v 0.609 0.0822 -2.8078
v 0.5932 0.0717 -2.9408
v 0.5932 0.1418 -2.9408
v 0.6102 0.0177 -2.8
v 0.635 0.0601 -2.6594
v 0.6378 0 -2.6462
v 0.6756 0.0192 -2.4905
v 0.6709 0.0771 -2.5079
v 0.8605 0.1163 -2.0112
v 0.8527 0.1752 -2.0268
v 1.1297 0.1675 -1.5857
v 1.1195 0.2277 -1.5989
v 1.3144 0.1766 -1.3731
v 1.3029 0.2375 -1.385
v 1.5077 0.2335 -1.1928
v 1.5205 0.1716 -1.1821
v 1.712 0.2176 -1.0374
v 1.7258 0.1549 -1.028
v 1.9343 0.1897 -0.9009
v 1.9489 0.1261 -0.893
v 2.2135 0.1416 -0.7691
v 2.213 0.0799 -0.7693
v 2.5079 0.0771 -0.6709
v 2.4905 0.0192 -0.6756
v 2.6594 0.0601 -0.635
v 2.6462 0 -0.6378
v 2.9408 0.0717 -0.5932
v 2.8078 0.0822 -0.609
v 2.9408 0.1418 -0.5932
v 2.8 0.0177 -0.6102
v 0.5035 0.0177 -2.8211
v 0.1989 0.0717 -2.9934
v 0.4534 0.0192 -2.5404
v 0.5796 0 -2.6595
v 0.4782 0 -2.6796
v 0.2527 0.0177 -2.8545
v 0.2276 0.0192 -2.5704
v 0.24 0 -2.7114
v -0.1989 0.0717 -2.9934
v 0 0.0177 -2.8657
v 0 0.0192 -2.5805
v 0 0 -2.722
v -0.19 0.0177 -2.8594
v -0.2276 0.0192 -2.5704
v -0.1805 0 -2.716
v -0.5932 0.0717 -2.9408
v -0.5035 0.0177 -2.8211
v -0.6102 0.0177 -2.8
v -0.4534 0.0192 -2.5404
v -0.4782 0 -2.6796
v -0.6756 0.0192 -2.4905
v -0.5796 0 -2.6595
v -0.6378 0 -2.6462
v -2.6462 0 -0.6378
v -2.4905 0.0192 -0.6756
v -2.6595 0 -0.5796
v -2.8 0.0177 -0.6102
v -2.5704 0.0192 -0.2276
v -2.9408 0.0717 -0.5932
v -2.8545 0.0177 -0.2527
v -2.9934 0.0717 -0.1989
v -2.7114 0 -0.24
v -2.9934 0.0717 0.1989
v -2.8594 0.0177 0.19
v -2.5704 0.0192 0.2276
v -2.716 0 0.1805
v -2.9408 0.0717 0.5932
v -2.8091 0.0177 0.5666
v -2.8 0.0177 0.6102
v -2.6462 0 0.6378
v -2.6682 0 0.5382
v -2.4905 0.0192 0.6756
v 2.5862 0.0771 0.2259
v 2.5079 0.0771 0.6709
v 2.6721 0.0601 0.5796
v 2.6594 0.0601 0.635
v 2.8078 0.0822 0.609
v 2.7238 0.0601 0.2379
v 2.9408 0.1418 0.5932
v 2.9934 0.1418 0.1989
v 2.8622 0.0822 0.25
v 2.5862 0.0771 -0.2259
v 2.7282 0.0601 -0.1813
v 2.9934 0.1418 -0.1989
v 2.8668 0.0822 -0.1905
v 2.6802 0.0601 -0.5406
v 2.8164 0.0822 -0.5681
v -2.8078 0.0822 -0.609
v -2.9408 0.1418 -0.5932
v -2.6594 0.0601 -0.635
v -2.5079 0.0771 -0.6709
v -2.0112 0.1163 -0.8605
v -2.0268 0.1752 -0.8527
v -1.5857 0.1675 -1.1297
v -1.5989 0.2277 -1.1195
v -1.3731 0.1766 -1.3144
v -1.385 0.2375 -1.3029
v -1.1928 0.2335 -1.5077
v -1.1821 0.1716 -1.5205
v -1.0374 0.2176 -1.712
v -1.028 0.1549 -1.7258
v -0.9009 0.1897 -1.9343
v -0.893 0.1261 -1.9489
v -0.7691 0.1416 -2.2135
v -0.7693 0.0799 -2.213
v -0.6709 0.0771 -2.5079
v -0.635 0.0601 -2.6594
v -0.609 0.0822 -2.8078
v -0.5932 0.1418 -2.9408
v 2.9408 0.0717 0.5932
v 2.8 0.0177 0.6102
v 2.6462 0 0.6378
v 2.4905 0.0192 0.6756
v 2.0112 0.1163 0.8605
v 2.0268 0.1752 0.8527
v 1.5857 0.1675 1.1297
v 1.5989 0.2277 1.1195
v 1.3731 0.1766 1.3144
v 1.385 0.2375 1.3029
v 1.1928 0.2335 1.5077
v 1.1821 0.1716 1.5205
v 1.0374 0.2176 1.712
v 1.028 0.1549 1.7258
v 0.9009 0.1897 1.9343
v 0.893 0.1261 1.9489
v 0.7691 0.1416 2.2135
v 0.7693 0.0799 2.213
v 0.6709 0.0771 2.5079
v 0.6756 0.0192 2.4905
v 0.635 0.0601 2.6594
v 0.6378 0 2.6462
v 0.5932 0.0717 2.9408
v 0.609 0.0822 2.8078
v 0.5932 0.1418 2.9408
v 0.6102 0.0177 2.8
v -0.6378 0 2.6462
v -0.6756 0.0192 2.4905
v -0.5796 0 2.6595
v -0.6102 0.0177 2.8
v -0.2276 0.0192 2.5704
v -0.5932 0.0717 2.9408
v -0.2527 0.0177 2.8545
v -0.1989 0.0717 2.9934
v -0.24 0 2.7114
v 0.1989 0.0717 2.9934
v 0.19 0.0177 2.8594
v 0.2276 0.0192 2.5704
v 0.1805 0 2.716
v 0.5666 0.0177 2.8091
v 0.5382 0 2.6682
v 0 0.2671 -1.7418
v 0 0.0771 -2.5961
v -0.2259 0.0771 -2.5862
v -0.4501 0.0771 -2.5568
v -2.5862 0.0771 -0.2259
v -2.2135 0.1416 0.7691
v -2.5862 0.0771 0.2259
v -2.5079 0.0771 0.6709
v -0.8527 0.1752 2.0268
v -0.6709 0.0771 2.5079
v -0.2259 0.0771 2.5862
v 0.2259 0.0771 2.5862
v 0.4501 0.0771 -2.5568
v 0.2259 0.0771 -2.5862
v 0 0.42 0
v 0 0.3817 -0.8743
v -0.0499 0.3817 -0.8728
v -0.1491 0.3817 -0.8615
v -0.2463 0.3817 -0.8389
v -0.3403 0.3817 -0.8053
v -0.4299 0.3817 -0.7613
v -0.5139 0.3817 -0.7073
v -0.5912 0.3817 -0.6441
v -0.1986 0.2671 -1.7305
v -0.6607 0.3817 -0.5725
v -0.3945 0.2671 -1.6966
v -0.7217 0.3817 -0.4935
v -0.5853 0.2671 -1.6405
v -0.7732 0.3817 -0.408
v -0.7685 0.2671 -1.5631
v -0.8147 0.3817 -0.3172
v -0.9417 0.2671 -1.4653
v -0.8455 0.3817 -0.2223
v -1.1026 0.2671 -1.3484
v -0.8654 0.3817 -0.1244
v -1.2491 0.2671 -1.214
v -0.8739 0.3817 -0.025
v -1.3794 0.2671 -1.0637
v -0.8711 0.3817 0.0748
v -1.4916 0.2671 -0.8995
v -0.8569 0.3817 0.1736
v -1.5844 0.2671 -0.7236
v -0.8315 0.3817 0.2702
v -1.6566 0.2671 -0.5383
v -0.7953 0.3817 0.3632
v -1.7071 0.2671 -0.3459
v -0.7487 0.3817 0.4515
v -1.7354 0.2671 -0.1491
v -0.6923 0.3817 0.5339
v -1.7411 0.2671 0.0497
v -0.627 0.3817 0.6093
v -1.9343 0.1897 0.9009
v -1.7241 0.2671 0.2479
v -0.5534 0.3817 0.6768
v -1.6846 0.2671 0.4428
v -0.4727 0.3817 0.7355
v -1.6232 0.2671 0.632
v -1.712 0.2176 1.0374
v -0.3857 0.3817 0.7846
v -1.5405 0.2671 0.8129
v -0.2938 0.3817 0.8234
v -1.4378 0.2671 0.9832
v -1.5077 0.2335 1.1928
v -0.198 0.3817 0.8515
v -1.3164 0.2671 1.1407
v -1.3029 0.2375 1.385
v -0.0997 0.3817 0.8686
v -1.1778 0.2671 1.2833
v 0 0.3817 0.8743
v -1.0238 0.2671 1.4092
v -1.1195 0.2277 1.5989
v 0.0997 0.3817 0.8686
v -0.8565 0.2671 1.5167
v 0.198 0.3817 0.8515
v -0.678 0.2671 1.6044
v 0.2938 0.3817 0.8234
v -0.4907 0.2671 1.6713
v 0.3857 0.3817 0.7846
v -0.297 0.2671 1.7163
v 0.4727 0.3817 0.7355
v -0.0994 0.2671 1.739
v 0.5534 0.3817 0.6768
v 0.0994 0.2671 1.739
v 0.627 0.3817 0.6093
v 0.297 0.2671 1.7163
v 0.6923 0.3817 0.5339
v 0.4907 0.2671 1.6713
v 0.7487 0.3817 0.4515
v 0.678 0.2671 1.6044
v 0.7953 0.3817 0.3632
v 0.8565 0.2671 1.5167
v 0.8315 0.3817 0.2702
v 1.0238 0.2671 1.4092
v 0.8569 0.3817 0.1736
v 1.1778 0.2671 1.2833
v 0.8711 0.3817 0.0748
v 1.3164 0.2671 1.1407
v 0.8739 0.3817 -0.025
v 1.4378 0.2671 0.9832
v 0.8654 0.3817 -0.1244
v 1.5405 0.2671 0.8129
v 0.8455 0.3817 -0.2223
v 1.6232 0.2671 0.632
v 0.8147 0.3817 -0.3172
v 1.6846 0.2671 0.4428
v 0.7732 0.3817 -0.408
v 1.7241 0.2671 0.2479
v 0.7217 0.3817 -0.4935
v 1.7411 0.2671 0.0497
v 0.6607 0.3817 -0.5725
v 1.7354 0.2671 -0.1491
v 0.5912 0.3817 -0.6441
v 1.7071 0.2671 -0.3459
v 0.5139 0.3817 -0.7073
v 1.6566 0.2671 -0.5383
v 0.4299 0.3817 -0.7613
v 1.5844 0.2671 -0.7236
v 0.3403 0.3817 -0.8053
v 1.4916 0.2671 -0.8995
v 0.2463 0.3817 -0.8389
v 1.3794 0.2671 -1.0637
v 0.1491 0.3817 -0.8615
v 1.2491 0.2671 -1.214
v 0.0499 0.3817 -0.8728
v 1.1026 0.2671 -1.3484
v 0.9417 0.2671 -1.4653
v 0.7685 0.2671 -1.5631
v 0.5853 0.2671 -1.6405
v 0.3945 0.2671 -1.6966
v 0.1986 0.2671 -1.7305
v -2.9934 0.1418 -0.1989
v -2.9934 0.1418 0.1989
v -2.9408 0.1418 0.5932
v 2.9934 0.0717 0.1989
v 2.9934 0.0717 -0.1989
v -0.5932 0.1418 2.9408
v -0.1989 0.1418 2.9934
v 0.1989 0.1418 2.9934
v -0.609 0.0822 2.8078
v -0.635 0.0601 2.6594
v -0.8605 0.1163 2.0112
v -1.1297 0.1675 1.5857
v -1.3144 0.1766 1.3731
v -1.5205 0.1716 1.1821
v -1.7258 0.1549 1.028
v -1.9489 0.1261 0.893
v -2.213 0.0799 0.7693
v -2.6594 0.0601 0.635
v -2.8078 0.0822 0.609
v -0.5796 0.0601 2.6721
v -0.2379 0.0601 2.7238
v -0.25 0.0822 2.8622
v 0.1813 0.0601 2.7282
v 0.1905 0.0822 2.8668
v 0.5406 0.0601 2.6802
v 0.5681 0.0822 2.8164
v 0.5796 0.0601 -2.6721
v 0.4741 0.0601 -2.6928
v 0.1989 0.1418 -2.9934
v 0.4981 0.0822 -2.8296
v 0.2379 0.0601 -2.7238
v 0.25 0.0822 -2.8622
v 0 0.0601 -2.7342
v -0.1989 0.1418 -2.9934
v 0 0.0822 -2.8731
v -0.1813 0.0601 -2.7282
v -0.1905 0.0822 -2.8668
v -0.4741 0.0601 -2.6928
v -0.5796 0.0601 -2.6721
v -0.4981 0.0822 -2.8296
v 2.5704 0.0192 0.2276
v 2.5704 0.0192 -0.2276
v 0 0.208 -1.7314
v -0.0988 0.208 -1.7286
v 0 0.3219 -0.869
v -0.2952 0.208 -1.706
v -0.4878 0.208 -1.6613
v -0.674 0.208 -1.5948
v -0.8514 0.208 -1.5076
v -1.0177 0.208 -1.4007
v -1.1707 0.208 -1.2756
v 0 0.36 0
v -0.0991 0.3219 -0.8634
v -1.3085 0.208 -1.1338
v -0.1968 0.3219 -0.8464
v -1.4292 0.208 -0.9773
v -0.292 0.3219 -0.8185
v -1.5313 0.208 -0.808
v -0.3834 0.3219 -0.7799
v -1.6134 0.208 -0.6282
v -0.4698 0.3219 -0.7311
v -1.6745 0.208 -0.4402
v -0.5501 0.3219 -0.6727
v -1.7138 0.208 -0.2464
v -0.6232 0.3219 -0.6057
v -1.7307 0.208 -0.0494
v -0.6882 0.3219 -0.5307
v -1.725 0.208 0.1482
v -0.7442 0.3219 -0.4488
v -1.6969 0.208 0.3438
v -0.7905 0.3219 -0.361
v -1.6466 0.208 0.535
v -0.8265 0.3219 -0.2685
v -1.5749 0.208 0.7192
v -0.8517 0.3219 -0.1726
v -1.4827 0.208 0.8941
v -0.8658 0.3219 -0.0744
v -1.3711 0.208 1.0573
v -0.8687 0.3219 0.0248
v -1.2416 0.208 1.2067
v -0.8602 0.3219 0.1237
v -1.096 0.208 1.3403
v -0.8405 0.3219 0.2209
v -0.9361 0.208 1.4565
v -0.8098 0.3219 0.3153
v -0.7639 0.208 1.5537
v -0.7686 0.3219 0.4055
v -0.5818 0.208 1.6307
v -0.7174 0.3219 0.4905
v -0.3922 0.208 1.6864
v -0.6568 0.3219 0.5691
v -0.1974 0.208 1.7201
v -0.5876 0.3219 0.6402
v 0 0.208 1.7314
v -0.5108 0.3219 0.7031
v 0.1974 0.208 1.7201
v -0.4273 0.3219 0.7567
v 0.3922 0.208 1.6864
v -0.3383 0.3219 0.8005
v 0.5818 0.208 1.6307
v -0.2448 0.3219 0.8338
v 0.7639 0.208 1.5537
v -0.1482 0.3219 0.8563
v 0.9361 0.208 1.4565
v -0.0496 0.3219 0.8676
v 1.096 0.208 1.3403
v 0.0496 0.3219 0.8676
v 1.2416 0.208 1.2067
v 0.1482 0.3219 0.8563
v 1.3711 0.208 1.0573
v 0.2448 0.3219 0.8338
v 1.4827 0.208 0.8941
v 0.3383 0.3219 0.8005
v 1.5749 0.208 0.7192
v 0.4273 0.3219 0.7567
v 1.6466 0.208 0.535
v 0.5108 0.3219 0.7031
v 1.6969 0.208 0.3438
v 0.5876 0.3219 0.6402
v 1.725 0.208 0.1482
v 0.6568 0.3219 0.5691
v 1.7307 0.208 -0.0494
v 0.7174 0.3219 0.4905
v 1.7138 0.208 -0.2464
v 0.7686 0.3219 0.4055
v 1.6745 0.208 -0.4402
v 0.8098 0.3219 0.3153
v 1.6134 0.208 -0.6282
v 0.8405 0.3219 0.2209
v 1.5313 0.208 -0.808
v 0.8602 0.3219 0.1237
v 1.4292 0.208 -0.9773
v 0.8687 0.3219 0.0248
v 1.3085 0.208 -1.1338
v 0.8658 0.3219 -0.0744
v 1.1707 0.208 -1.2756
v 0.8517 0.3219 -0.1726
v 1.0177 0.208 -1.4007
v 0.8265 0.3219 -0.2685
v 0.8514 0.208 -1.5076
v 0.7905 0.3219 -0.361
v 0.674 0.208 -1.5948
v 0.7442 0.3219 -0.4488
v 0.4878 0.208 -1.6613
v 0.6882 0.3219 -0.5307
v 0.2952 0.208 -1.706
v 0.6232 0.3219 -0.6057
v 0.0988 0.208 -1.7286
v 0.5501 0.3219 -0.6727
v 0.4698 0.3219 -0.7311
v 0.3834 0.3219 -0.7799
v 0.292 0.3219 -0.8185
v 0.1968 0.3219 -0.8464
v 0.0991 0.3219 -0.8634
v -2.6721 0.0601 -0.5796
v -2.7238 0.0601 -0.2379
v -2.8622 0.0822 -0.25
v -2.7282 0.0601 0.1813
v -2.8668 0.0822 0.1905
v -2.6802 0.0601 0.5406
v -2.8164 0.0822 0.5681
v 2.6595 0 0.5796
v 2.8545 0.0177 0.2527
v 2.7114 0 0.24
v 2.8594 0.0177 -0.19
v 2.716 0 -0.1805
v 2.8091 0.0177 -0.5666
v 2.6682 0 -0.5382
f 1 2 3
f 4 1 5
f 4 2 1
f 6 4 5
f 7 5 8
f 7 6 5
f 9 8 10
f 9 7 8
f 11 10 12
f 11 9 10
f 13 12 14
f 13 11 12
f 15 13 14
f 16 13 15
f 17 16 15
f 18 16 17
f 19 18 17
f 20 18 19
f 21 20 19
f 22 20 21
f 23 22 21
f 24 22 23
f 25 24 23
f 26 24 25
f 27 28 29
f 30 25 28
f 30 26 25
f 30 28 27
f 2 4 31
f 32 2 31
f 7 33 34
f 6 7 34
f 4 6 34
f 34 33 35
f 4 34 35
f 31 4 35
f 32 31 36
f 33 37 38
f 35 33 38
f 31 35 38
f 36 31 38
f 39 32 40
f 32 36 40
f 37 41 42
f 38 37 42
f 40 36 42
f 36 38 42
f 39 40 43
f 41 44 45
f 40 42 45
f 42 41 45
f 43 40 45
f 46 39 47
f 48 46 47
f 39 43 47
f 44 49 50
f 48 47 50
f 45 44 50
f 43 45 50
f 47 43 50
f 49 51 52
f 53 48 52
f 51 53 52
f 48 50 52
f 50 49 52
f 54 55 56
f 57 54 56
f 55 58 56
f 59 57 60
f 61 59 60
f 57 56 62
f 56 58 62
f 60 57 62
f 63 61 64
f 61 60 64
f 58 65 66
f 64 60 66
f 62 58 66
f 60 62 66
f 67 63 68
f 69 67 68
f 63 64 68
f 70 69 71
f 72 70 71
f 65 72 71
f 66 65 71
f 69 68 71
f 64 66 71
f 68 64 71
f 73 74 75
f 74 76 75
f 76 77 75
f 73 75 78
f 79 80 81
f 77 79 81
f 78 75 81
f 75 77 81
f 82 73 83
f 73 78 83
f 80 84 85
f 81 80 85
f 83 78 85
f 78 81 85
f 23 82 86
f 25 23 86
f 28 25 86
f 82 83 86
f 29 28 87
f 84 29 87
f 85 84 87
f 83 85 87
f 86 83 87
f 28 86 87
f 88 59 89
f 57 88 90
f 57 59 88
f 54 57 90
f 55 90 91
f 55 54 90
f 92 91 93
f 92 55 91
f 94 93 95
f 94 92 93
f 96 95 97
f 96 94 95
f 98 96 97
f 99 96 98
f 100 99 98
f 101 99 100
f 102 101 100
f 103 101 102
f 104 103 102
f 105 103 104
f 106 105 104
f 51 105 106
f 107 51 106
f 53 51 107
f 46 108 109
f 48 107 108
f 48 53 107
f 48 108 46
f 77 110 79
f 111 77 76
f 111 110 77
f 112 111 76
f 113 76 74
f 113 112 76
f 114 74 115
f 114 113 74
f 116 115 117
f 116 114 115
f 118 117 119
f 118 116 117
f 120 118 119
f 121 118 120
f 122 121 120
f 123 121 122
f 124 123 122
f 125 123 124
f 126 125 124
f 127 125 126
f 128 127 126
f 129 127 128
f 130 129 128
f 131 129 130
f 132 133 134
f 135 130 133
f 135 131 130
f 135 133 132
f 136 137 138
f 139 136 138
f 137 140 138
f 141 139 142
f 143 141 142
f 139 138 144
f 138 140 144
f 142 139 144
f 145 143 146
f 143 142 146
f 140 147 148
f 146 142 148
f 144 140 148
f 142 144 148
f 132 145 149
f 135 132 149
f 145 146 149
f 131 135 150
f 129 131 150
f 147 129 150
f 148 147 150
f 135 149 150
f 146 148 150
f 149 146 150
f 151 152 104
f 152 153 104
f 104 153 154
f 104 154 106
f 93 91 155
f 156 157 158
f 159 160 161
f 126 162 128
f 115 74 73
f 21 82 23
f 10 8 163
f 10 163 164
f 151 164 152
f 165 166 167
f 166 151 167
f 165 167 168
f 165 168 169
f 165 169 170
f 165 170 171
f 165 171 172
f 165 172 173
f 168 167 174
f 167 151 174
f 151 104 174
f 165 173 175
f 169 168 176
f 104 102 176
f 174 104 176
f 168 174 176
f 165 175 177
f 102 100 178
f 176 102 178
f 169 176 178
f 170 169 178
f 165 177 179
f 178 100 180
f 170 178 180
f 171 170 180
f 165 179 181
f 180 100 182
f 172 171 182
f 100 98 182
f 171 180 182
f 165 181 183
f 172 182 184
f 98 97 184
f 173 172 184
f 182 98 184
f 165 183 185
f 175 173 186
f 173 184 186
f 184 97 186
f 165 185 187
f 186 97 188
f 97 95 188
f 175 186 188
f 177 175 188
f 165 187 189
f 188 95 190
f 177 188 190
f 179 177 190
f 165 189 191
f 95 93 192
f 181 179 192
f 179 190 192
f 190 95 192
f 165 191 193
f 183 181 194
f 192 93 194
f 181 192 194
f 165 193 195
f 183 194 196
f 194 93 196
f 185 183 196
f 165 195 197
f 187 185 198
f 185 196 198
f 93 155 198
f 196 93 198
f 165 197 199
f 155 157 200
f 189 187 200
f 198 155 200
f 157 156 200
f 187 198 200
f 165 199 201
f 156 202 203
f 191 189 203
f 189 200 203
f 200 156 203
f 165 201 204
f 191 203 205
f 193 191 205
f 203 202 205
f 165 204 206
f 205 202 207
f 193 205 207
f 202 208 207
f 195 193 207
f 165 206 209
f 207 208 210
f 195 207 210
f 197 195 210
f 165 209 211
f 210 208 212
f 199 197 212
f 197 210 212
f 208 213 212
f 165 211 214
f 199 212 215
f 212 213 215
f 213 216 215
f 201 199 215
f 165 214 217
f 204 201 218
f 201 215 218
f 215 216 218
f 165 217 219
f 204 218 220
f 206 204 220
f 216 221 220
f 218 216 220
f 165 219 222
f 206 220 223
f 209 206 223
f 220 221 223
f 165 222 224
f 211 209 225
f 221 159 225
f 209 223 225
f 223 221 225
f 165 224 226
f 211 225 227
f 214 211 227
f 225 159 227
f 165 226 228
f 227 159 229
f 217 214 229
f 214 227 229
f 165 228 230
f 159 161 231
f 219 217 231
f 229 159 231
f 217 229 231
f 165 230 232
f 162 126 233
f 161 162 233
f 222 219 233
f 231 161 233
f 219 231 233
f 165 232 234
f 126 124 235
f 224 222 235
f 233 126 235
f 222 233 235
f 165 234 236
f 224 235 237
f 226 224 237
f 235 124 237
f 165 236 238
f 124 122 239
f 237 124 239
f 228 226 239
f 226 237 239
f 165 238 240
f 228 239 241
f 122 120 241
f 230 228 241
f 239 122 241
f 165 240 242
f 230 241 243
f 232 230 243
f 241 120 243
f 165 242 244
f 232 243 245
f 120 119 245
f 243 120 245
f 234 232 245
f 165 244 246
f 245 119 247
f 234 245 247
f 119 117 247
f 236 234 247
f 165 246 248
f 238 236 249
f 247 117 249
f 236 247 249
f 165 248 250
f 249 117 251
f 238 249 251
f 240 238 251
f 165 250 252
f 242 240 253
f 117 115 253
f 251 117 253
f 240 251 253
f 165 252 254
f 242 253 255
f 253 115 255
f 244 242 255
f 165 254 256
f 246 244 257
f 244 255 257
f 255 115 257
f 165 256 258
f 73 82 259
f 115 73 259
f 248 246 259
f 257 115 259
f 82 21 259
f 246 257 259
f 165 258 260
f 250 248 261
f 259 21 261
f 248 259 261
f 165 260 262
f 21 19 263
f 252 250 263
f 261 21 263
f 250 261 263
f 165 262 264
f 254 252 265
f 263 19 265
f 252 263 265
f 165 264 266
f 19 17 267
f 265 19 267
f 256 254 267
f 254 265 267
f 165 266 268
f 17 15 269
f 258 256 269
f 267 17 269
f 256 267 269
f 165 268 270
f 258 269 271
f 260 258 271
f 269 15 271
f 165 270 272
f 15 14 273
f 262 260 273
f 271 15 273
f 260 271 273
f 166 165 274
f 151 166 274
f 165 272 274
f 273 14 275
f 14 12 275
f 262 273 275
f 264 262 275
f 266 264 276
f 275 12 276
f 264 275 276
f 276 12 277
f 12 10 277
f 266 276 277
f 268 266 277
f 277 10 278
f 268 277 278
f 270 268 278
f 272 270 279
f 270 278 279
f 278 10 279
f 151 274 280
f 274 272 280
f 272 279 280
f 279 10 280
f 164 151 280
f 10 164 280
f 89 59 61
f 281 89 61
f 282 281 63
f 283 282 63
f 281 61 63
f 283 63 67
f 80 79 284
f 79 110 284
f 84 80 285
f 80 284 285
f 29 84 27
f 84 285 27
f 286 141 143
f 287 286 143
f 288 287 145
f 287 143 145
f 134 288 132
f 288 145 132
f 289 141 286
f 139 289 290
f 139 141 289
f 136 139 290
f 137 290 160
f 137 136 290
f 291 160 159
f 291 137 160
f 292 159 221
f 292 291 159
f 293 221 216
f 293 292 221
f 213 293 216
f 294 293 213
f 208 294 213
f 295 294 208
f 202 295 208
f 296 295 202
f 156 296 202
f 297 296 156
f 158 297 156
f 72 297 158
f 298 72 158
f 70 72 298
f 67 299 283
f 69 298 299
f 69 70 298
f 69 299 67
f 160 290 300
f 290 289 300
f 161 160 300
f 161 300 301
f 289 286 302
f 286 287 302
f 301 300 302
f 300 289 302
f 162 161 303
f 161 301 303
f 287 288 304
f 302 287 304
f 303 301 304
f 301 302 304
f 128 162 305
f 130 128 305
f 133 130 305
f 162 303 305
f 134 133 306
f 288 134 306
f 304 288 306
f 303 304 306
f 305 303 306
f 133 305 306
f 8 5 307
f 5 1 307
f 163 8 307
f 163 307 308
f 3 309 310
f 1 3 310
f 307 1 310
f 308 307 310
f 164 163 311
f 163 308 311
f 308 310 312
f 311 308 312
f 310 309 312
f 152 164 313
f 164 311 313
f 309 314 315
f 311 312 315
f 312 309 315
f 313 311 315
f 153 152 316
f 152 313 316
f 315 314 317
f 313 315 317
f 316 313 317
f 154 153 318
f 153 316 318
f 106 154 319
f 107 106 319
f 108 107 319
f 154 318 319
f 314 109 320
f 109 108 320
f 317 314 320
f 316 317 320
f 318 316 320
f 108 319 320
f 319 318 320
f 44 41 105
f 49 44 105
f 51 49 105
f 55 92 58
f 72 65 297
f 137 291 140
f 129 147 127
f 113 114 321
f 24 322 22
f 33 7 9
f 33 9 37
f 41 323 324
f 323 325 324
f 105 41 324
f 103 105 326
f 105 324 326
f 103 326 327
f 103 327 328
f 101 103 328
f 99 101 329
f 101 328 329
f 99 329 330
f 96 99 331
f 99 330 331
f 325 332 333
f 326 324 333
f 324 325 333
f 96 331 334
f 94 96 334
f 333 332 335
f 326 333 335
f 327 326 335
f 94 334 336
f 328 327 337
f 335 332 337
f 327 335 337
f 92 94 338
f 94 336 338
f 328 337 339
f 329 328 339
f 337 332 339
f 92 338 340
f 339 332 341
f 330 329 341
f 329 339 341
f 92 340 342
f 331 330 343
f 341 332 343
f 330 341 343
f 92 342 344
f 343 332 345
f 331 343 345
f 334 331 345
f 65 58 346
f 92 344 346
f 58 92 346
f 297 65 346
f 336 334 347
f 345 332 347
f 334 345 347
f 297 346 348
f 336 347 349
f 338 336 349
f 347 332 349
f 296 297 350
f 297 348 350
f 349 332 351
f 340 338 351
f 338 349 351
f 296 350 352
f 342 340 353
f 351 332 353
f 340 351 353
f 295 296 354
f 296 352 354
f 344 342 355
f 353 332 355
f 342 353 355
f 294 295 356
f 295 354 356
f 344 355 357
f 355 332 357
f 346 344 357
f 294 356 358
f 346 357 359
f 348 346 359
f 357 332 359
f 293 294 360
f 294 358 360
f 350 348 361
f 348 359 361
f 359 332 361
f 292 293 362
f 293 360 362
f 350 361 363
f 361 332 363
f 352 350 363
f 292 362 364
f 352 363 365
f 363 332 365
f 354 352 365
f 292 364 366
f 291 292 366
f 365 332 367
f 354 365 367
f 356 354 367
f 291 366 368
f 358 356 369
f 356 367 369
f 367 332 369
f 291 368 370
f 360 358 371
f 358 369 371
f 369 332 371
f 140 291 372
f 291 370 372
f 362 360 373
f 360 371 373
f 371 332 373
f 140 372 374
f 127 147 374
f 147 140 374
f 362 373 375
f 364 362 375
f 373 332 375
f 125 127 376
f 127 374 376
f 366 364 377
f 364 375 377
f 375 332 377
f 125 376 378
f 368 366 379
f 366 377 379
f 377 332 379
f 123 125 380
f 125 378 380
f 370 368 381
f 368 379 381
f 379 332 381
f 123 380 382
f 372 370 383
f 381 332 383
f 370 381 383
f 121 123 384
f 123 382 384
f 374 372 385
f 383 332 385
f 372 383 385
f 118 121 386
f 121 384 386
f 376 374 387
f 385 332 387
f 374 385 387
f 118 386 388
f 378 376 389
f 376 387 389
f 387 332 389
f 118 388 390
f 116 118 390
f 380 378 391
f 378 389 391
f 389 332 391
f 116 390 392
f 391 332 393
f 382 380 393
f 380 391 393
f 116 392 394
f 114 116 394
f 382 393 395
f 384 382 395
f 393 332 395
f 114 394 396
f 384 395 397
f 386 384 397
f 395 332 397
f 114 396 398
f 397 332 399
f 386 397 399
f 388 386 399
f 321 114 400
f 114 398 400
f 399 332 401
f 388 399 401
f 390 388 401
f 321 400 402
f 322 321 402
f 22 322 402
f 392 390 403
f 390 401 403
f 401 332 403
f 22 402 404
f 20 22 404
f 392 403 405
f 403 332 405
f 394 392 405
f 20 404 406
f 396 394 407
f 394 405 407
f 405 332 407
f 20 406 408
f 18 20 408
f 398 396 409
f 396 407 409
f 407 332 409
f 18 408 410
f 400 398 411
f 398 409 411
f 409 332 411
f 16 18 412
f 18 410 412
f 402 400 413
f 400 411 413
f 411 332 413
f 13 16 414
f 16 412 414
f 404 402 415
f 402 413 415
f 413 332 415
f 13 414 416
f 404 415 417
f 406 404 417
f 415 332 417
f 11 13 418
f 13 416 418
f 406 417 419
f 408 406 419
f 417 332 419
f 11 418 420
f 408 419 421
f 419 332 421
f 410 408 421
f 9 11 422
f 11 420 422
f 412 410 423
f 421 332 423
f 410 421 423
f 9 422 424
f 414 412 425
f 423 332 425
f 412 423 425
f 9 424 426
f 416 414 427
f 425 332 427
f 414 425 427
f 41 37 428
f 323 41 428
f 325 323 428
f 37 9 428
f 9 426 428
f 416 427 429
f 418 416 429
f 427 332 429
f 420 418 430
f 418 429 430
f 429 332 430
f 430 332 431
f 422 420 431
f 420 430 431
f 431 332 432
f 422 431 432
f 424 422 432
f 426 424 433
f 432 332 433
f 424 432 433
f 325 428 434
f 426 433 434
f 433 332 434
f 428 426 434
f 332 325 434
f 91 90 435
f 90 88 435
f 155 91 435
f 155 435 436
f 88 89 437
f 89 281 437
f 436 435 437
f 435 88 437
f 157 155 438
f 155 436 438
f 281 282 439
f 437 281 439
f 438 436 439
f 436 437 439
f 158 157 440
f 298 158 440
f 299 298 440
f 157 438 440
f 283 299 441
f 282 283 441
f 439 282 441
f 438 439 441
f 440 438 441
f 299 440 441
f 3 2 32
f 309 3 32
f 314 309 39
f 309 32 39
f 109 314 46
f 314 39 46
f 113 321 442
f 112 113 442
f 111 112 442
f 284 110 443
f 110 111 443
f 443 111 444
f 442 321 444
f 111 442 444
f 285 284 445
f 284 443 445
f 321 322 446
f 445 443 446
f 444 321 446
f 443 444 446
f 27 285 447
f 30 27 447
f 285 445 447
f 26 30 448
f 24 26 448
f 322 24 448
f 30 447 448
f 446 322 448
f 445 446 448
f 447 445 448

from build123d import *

# Parameters (mm, degrees)
CUT_EXTRUDE1_DEPTH = 5.263378942


with BuildPart() as part:
    # Sketch5 → Revolve1 (revolve)
    with BuildSketch(Plane.XY, mode=Mode.PRIVATE) as revolve1_sk:
        with BuildLine():
            Line((0, 0.36), (0, 0.42))
            ThreePointArc((0, 0.42), (1.309307341, 0.333915185), (2.596072387, 0.077142857))
            ThreePointArc((2.596072387, 0.077142857), (2.804955652, 0.066293195), (3, 0.141842092))
            Line((3, 0.141842092), (3, 0.071680396))
            ThreePointArc((3, 0.071680396), (2.795390742, 0.004331302), (2.580495952, 0.0192))
            ThreePointArc((2.580495952, 0.0192), (1.301451497, 0.274431693), (0, 0.36))
        make_face()
    revolve(revolve1_sk.sketch.rotate(Axis((0, -0.907364639, 0), (0, 1, 0)), 90), axis=Axis((0, -0.907364639, 0), (0, 1, 0)))

    # Sketch6 → Cut-Extrude1 (cut, through all)
    with BuildSketch(Plane(origin=(0, 0, 0), x_dir=(1, 0, 0), z_dir=(0, 1, 0))):
        with BuildLine():
            ThreePointArc((0.593193751, 2.940768807), (1.343502884, 1.343502884), (2.940768807, 0.593193751))
            ThreePointArc((2.940768807, 0.593193751), (2.121320344, 2.121320344), (0.593193751, 2.940768807))
        make_face()
        with BuildLine():
            ThreePointArc((2.940768807, -0.593193751), (1.343502884, -1.343502884), (0.593193751, -2.940768807))
            ThreePointArc((0.593193751, -2.940768807), (2.121320344, -2.121320344), (2.940768807, -0.593193751))
        make_face()
        with BuildLine():
            ThreePointArc((-0.593193751, -2.940768807), (-1.343502884, -1.343502884), (-2.940768807, -0.593193751))
            ThreePointArc((-2.940768807, -0.593193751), (-2.121320344, -2.121320344), (-0.593193751, -2.940768807))
        make_face()
        with BuildLine():
            ThreePointArc((-2.940768807, 0.593193751), (-1.343502884, 1.343502884), (-0.593193751, 2.940768807))
            ThreePointArc((-0.593193751, 2.940768807), (-2.121320344, 2.121320344), (-2.940768807, 0.593193751))
        make_face()
    extrude(amount=CUT_EXTRUDE1_DEPTH, mode=Mode.SUBTRACT)


solid = part.part
